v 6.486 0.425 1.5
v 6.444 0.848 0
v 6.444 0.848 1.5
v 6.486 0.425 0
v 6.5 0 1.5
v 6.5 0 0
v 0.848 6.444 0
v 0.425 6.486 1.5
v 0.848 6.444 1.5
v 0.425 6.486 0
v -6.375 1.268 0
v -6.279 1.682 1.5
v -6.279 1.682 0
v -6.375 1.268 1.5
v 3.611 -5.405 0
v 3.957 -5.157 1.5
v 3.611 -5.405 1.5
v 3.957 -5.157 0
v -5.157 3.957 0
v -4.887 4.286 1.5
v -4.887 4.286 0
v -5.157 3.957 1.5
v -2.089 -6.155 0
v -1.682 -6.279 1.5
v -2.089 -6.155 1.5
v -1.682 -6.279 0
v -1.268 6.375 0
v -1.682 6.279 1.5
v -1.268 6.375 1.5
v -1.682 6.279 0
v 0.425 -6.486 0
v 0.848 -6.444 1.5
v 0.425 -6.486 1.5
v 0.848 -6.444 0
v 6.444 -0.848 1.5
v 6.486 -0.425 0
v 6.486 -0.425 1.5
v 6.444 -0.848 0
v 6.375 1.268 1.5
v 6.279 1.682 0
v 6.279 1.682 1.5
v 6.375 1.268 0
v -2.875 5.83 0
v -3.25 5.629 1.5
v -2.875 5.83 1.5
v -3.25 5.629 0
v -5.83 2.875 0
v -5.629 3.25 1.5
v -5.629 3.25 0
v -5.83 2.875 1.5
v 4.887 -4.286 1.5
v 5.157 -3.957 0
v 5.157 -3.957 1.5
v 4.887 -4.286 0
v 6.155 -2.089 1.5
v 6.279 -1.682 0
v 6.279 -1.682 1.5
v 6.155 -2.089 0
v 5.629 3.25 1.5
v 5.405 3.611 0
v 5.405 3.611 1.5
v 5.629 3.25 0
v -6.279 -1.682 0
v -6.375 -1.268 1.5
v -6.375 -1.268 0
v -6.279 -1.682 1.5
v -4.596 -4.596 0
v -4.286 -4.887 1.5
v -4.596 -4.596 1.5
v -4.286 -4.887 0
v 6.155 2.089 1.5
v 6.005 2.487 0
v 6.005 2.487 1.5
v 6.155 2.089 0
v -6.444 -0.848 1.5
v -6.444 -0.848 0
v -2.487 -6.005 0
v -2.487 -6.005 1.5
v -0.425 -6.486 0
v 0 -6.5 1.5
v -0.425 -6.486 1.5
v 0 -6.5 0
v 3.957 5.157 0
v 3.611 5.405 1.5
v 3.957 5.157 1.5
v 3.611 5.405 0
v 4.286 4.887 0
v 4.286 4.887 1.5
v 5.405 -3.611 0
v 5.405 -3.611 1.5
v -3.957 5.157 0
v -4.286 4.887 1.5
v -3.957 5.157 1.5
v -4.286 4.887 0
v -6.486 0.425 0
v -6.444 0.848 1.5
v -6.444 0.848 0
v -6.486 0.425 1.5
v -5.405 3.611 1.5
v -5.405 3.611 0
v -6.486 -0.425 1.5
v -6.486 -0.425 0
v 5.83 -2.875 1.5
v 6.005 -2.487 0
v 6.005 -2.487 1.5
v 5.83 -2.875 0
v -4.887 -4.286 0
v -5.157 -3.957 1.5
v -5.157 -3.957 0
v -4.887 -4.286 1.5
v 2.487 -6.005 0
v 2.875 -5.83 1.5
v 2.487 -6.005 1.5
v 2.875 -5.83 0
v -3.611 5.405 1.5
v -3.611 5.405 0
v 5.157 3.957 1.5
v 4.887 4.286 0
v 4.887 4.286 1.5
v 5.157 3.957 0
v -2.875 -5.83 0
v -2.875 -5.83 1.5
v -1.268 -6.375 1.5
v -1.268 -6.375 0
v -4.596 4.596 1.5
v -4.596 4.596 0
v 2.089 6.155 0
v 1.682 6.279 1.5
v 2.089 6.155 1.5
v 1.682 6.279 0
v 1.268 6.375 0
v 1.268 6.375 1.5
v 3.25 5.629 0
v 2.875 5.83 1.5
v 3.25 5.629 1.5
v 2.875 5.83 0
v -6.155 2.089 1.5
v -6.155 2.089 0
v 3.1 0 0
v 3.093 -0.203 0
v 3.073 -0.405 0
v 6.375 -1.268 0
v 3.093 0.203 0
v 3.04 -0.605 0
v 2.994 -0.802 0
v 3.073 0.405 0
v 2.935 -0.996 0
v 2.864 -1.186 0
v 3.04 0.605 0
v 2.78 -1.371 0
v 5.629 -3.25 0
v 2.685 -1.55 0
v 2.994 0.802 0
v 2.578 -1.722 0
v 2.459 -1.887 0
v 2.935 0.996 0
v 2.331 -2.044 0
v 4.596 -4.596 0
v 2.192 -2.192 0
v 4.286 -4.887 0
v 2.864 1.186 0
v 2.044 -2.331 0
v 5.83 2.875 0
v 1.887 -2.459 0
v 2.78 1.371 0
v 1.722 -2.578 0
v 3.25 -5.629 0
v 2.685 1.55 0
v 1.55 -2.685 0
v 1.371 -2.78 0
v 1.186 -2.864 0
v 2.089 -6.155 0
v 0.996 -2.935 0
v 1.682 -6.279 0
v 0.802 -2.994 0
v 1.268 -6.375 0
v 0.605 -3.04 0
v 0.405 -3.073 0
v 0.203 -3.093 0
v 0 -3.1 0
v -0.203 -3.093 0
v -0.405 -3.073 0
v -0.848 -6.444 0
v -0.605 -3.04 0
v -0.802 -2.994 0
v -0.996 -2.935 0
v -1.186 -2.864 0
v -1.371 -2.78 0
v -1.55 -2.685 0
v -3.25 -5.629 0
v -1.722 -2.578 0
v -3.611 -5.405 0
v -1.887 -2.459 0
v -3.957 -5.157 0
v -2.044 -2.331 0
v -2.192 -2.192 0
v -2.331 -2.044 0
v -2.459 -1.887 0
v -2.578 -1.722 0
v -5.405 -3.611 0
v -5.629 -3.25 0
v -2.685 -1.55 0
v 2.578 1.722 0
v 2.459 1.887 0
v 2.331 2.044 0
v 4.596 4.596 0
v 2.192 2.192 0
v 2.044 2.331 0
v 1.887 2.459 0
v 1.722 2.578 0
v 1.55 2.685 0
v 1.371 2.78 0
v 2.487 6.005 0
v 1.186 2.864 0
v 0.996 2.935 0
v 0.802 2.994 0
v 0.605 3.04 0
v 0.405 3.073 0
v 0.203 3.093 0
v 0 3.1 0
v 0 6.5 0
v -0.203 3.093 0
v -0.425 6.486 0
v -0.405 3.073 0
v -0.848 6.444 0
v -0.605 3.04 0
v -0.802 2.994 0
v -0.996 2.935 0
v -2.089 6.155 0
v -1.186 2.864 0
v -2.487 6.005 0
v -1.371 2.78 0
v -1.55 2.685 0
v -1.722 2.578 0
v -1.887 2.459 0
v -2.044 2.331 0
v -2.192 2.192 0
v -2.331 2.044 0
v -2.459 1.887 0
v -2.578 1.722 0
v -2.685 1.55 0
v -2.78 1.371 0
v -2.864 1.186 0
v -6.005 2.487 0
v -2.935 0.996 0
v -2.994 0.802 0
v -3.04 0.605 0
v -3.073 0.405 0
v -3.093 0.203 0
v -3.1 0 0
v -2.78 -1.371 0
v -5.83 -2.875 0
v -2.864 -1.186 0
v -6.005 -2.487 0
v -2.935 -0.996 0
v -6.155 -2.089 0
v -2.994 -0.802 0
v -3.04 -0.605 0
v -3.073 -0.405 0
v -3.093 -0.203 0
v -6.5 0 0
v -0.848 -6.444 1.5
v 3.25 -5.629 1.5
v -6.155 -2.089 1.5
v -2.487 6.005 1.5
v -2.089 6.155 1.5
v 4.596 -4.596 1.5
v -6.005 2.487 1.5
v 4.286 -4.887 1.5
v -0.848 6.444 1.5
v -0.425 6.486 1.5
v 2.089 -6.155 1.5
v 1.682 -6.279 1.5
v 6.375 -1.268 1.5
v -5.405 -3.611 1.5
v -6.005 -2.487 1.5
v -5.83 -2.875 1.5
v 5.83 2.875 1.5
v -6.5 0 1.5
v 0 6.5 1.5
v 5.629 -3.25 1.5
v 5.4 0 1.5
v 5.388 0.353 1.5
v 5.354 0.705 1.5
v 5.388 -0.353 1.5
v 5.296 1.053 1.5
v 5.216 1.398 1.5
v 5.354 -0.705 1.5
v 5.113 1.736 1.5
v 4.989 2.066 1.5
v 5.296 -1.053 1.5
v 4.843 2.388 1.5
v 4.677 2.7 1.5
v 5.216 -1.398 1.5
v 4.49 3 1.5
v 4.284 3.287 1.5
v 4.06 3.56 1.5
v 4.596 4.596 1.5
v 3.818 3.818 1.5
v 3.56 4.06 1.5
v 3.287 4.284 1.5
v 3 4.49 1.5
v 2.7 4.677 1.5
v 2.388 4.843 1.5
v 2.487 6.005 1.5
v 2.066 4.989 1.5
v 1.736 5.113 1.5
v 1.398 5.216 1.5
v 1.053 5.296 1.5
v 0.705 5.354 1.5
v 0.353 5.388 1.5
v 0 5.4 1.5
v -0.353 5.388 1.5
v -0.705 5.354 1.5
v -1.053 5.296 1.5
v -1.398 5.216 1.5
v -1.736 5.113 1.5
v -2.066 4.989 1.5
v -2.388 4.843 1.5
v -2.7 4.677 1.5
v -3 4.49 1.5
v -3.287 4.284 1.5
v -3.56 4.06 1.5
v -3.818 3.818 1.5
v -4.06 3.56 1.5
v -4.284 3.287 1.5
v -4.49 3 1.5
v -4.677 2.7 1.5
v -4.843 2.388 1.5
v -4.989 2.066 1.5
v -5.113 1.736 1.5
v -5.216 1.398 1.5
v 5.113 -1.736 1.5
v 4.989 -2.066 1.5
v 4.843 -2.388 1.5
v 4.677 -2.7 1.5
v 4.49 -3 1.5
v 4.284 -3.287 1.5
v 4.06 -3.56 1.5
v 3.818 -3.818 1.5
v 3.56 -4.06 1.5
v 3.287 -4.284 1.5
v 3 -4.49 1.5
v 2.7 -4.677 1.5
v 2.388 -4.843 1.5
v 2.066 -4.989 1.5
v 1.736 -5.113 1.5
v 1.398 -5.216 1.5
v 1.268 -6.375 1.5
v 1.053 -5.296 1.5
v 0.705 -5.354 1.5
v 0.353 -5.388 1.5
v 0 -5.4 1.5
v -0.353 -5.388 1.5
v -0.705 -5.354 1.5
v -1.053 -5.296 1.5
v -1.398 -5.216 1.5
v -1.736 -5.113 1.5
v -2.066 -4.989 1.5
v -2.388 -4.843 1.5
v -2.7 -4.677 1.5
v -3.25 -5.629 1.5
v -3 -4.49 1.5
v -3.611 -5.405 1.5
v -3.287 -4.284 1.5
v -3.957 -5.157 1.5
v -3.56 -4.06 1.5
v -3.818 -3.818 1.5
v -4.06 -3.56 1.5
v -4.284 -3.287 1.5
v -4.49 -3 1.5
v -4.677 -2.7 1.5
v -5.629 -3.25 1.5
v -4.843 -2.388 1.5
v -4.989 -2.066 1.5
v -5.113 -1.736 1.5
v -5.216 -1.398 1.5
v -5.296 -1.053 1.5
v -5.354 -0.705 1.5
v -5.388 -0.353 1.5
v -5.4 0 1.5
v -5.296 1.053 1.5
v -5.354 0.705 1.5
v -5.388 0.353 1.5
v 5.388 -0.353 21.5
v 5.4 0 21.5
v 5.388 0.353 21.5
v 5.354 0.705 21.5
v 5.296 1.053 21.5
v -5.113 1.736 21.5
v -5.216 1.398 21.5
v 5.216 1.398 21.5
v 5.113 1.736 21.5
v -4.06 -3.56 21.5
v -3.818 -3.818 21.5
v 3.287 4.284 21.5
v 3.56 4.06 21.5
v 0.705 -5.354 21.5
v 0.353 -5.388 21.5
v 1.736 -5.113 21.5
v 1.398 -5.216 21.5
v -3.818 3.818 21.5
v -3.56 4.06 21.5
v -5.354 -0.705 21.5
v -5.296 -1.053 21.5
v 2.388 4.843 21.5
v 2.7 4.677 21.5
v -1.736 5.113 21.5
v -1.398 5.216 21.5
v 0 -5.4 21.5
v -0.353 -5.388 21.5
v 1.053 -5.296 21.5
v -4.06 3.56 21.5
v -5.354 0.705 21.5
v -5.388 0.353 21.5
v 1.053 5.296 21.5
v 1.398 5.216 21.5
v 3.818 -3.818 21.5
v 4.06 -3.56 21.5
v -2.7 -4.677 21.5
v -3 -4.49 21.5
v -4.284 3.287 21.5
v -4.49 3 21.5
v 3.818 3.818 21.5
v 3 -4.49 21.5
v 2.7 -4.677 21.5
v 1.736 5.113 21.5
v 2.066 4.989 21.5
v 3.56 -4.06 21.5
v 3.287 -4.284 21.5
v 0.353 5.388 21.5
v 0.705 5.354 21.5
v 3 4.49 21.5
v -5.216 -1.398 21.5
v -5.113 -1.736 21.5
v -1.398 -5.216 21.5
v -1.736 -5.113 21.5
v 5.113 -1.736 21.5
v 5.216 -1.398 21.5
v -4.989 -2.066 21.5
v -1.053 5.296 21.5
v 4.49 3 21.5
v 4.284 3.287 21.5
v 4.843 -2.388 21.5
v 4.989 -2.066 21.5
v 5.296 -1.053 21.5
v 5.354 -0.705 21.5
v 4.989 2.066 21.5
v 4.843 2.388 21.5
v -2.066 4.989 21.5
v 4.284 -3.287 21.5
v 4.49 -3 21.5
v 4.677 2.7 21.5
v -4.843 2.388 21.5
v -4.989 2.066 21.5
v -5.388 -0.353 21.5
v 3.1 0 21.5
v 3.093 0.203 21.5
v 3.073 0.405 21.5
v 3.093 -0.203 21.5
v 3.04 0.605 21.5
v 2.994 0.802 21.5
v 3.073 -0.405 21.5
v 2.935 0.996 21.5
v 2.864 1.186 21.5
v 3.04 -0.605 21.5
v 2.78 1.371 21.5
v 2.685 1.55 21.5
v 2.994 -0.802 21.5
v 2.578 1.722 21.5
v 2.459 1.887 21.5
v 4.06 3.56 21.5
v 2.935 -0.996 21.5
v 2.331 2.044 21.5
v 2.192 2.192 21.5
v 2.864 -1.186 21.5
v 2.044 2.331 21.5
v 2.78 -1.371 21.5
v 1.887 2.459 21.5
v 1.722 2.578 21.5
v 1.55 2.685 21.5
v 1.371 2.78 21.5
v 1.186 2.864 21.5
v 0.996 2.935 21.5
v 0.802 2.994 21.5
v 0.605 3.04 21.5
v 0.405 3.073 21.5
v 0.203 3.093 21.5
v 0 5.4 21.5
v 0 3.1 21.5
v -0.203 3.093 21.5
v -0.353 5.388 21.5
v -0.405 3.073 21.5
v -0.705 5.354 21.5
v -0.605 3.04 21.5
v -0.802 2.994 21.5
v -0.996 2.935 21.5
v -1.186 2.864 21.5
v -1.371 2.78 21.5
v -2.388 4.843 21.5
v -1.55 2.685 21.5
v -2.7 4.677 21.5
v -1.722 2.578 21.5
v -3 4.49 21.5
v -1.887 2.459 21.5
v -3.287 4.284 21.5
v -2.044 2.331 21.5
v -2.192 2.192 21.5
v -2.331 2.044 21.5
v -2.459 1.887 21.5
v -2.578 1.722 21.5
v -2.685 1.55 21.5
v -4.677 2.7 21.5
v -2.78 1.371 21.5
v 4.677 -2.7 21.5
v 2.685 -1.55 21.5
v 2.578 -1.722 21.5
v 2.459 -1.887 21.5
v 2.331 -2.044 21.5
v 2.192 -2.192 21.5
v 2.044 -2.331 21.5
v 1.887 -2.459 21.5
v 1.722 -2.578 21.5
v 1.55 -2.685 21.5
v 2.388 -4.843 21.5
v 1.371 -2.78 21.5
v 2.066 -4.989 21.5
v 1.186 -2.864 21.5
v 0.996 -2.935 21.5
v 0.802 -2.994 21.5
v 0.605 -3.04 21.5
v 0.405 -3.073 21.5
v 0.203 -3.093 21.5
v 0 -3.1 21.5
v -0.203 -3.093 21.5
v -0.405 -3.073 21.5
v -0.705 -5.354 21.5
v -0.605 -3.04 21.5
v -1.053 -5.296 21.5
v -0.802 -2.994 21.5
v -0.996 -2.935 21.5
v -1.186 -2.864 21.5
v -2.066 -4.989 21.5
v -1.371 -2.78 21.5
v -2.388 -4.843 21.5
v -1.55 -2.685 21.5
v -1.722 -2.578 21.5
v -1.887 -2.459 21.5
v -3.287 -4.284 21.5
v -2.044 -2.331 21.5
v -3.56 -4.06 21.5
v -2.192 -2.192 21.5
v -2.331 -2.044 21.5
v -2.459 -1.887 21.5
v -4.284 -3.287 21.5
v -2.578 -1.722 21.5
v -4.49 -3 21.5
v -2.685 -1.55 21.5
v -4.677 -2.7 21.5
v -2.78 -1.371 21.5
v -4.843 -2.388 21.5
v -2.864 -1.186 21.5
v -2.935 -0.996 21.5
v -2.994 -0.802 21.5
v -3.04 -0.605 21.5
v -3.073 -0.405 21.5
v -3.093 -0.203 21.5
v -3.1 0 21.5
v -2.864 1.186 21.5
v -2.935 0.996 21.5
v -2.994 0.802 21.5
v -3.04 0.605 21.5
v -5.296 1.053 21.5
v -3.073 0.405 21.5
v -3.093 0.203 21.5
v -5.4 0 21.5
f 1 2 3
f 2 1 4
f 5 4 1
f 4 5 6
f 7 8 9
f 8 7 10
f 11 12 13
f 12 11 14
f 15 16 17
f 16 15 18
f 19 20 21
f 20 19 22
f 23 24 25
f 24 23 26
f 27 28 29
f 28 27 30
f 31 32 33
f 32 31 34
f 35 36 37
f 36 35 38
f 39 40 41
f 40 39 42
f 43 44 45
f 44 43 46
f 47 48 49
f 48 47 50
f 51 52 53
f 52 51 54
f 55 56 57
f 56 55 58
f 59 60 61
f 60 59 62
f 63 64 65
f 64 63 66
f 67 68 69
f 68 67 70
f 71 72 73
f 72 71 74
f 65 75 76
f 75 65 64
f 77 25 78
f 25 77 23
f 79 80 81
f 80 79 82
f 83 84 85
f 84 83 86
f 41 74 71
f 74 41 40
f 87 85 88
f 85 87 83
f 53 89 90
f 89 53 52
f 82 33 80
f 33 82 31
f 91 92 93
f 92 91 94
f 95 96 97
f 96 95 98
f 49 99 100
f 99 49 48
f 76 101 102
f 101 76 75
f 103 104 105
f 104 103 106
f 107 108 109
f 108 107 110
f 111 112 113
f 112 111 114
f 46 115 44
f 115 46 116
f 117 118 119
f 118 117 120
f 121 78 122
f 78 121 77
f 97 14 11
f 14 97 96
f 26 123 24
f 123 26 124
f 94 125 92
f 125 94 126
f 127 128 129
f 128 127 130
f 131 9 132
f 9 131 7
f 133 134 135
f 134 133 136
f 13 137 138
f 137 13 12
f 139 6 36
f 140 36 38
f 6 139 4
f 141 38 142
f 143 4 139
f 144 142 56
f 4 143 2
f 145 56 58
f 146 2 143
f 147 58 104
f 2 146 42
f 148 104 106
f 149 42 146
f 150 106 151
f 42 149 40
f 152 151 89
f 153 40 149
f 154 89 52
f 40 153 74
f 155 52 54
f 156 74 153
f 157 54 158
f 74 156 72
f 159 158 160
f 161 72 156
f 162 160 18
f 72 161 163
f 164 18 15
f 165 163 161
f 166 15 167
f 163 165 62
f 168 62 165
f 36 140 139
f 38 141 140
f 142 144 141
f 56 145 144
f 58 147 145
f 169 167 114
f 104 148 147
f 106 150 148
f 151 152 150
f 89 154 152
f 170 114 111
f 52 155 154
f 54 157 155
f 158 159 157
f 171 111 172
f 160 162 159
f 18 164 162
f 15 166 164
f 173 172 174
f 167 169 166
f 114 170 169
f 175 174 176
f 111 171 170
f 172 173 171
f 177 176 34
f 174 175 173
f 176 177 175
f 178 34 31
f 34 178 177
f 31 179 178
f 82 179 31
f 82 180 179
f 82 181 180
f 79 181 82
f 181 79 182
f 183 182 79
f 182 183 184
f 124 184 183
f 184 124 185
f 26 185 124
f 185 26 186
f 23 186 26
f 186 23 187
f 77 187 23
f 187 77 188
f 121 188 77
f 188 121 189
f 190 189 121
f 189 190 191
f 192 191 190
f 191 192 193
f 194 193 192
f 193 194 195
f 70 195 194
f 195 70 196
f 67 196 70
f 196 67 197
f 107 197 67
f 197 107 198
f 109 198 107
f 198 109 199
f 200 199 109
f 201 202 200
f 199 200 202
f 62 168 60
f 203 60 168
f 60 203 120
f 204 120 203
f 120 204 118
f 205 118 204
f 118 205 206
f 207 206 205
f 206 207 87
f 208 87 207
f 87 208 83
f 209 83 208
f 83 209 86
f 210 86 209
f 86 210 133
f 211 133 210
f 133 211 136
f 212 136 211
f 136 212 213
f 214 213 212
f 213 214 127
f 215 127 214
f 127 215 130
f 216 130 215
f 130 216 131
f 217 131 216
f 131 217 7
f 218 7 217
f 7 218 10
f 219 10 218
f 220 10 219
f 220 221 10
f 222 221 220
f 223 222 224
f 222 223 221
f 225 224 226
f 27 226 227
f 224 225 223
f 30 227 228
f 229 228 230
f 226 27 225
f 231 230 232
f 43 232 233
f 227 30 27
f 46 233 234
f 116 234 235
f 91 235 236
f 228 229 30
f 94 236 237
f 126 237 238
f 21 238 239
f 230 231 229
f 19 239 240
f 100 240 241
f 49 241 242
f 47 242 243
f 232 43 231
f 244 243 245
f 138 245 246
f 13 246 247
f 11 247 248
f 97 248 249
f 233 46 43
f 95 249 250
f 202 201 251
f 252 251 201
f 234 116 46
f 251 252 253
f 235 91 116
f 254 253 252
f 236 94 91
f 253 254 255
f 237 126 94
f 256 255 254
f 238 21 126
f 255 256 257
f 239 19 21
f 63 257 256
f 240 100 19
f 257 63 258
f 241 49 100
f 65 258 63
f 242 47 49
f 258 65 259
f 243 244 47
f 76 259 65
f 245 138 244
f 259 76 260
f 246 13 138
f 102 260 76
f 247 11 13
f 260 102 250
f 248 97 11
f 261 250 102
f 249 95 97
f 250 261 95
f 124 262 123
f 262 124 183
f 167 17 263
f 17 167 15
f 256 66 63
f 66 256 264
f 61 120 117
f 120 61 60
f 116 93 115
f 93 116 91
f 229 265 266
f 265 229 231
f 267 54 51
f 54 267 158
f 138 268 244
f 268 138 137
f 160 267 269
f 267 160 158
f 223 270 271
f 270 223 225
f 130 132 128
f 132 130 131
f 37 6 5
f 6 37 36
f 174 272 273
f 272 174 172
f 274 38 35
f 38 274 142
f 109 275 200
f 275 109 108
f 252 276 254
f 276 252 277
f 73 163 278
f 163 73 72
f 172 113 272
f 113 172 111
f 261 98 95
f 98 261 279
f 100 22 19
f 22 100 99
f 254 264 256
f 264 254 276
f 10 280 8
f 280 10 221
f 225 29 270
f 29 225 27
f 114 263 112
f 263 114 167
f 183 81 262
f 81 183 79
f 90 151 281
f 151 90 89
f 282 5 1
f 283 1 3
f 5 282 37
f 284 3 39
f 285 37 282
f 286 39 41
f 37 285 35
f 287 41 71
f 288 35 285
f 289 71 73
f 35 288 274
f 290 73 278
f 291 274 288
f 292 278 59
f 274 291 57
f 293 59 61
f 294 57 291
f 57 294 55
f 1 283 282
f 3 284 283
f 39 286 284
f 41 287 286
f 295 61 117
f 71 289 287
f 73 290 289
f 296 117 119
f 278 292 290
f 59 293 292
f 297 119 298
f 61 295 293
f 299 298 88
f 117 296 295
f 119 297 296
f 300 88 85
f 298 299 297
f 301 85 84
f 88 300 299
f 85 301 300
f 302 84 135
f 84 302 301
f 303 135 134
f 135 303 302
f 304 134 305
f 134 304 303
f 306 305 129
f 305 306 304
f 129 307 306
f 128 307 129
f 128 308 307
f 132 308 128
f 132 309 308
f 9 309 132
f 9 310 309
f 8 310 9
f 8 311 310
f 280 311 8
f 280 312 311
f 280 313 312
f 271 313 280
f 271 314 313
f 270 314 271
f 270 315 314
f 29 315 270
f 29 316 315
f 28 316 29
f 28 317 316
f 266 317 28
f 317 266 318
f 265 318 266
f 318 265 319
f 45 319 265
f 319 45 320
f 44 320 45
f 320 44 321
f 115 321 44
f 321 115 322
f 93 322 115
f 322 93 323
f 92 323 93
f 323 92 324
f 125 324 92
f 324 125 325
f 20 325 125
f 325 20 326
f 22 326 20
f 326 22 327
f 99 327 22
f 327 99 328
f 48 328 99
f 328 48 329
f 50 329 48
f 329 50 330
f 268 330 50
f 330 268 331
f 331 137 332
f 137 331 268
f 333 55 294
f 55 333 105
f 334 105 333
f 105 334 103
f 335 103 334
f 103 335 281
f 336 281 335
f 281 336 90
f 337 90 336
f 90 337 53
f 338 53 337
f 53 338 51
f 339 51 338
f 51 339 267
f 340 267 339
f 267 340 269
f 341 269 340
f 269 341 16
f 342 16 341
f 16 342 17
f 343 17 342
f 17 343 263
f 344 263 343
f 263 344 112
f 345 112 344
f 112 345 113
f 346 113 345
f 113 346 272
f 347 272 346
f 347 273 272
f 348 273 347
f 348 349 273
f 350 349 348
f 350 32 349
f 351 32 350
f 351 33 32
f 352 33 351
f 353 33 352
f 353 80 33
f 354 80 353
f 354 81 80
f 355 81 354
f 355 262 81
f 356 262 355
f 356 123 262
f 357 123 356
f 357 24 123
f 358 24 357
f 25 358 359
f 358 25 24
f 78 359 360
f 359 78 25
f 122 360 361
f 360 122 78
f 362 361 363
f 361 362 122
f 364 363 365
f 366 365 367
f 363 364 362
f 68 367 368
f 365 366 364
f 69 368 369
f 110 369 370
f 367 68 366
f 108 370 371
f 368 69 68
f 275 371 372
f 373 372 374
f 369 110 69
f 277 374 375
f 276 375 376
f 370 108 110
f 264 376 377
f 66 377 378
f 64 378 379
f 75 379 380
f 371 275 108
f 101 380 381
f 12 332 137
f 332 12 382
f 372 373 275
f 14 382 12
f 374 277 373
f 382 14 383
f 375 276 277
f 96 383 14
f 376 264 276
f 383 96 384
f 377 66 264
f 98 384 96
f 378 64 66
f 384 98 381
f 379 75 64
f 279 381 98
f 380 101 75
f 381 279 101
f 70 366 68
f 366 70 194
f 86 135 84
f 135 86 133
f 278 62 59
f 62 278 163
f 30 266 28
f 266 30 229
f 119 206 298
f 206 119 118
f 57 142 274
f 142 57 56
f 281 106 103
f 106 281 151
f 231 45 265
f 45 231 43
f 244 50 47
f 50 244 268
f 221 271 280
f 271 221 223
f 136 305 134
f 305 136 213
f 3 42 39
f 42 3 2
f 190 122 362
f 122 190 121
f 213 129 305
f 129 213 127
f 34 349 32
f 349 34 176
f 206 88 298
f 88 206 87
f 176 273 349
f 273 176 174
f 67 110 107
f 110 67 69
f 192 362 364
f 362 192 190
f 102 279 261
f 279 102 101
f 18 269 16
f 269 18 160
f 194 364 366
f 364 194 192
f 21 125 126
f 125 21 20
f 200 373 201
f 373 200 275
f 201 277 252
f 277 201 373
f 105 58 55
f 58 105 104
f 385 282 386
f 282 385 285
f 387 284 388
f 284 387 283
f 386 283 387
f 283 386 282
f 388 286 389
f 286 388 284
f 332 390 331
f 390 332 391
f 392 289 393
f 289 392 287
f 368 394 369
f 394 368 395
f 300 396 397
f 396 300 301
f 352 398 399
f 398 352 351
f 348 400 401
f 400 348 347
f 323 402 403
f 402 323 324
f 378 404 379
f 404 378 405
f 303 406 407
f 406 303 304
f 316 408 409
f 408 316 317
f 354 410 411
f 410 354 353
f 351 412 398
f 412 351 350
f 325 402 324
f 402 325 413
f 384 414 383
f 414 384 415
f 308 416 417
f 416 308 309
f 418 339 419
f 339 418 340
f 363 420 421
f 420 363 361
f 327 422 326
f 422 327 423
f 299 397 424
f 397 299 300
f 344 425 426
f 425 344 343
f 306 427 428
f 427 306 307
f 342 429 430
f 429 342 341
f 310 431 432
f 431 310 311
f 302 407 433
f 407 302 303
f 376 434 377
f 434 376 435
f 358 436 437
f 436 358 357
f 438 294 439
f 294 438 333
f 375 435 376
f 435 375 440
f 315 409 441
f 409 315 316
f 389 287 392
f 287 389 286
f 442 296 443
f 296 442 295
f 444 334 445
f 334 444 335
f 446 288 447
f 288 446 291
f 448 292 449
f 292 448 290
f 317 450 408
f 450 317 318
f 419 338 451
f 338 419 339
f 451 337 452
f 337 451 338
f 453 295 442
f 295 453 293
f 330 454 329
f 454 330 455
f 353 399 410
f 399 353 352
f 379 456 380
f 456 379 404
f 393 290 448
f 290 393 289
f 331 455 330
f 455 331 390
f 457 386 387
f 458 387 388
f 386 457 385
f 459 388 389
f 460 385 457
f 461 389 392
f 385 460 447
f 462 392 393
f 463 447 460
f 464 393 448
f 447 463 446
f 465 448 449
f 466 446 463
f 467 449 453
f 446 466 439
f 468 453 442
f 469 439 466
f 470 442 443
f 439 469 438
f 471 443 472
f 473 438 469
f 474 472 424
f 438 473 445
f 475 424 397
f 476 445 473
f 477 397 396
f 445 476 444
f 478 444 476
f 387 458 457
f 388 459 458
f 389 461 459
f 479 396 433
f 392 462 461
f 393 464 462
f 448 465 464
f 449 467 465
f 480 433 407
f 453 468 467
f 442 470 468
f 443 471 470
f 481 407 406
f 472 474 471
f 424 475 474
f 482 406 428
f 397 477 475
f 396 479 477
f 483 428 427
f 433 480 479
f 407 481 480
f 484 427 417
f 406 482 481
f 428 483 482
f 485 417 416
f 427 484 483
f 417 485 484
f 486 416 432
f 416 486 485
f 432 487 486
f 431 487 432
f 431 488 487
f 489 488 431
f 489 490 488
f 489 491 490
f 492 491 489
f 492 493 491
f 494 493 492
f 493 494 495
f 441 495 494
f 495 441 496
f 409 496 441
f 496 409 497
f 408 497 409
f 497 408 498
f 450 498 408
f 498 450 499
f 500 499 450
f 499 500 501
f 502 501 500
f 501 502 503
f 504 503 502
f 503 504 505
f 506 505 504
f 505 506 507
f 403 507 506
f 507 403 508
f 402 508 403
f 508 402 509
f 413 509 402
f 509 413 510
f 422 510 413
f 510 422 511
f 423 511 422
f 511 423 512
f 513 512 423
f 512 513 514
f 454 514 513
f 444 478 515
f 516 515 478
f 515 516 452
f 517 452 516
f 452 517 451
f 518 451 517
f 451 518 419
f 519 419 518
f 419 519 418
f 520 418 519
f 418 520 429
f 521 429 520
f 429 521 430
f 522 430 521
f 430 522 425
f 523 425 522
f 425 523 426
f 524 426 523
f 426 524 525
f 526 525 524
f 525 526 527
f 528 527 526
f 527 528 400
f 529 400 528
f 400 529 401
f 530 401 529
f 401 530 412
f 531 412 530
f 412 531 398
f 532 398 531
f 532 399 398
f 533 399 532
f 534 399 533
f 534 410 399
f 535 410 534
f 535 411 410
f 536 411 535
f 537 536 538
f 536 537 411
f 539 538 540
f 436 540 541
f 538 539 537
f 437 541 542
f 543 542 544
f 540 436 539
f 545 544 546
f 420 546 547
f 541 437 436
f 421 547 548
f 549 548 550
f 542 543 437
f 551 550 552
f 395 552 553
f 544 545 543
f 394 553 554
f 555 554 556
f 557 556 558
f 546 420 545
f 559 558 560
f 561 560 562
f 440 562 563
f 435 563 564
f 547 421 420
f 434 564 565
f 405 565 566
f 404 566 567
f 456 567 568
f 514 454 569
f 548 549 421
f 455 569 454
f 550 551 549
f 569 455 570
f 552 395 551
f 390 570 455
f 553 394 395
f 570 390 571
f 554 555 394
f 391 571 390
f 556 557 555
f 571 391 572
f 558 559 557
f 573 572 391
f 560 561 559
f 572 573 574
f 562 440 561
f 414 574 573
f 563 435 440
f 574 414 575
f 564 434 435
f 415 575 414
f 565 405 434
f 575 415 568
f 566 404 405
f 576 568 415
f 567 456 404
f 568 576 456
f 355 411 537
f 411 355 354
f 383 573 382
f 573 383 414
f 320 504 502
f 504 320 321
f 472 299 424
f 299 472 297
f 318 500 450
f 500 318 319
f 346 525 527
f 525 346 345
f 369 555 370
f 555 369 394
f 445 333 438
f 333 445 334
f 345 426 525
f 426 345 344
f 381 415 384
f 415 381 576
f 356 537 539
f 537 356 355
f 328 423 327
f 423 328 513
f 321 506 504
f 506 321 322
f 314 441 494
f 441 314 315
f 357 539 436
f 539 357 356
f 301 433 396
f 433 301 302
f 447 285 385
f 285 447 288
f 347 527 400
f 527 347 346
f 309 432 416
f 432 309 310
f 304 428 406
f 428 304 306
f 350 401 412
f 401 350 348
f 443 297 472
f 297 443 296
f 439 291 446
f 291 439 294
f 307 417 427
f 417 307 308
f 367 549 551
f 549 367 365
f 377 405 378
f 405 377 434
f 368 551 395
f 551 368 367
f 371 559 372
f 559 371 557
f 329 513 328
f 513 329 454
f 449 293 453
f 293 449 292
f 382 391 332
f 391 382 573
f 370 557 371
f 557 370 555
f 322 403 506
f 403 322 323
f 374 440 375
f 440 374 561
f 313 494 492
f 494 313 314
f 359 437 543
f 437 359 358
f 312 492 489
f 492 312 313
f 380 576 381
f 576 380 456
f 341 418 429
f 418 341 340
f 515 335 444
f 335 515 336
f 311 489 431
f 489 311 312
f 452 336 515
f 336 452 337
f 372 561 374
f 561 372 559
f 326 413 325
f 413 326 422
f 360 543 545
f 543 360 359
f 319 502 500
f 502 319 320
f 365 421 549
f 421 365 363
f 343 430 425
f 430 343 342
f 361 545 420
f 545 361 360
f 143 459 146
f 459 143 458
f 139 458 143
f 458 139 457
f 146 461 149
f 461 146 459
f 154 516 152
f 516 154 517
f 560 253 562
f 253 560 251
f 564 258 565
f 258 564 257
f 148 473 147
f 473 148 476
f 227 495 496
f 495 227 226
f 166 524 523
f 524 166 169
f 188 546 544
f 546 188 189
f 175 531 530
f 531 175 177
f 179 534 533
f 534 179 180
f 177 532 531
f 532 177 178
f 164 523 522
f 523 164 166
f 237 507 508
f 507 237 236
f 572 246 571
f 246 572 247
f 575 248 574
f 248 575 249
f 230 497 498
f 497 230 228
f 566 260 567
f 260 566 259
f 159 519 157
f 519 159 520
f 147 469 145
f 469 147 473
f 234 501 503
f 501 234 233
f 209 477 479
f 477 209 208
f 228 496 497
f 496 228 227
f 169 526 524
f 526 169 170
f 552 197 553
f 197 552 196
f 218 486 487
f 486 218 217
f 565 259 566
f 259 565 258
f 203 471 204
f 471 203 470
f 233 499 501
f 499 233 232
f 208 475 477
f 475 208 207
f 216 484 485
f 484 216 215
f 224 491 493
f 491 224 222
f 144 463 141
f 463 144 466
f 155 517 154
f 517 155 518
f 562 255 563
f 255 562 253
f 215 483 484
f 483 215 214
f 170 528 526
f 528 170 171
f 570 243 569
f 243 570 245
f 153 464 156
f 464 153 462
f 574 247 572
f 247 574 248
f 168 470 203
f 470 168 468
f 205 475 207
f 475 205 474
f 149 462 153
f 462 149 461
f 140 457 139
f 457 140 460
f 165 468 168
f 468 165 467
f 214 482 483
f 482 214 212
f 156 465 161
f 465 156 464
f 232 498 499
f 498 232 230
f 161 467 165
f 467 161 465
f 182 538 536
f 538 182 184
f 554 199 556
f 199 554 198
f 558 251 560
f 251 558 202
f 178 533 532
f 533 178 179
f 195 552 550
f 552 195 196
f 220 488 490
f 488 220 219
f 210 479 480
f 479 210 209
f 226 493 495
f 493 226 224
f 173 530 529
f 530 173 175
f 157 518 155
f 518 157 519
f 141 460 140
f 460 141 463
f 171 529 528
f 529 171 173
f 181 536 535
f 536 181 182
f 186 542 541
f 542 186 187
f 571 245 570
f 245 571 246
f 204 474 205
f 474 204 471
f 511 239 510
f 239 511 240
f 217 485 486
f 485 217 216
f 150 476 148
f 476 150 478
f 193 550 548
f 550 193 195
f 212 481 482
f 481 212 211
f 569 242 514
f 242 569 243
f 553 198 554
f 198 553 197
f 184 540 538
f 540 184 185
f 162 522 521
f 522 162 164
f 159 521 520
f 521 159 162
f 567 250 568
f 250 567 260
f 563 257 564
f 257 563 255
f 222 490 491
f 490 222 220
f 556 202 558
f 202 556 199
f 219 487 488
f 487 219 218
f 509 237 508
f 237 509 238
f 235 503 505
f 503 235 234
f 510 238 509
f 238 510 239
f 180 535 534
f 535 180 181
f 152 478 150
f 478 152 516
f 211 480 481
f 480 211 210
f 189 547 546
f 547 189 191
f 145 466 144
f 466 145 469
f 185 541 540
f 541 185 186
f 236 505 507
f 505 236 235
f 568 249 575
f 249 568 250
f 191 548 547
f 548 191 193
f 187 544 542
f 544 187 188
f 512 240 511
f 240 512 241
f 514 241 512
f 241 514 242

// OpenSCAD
// Adapter sleeve: 0.2 mL PCR tube in a 1.5 mL tube rack hole
// Printed upside down: collar on the bed, sleeve body rising upward.

$fn = 96;

// --- Dimensions (mm) ---
collar_d      = 13;    // collar outer diameter
collar_h      = 1.5;   // collar thickness (z = 0 to 1.5)
body_d        = 10.8;  // sleeve body outer diameter
total_h       = 21.5;  // overall height (top of sleeve body)
bore_d        = 6.2;   // straight through-bore diameter
eps           = 0.5;   // cutter overshoot past faces

difference() {
    union() {
        // Collar lying on the bed
        cylinder(d = collar_d, h = collar_h);
        // Sleeve body rising from the collar
        cylinder(d = body_d, h = total_h);
    }
    // Through-bore, open at both ends
    translate([0, 0, -eps])
        cylinder(d = bore_d, h = total_h + 2 * eps);
}
